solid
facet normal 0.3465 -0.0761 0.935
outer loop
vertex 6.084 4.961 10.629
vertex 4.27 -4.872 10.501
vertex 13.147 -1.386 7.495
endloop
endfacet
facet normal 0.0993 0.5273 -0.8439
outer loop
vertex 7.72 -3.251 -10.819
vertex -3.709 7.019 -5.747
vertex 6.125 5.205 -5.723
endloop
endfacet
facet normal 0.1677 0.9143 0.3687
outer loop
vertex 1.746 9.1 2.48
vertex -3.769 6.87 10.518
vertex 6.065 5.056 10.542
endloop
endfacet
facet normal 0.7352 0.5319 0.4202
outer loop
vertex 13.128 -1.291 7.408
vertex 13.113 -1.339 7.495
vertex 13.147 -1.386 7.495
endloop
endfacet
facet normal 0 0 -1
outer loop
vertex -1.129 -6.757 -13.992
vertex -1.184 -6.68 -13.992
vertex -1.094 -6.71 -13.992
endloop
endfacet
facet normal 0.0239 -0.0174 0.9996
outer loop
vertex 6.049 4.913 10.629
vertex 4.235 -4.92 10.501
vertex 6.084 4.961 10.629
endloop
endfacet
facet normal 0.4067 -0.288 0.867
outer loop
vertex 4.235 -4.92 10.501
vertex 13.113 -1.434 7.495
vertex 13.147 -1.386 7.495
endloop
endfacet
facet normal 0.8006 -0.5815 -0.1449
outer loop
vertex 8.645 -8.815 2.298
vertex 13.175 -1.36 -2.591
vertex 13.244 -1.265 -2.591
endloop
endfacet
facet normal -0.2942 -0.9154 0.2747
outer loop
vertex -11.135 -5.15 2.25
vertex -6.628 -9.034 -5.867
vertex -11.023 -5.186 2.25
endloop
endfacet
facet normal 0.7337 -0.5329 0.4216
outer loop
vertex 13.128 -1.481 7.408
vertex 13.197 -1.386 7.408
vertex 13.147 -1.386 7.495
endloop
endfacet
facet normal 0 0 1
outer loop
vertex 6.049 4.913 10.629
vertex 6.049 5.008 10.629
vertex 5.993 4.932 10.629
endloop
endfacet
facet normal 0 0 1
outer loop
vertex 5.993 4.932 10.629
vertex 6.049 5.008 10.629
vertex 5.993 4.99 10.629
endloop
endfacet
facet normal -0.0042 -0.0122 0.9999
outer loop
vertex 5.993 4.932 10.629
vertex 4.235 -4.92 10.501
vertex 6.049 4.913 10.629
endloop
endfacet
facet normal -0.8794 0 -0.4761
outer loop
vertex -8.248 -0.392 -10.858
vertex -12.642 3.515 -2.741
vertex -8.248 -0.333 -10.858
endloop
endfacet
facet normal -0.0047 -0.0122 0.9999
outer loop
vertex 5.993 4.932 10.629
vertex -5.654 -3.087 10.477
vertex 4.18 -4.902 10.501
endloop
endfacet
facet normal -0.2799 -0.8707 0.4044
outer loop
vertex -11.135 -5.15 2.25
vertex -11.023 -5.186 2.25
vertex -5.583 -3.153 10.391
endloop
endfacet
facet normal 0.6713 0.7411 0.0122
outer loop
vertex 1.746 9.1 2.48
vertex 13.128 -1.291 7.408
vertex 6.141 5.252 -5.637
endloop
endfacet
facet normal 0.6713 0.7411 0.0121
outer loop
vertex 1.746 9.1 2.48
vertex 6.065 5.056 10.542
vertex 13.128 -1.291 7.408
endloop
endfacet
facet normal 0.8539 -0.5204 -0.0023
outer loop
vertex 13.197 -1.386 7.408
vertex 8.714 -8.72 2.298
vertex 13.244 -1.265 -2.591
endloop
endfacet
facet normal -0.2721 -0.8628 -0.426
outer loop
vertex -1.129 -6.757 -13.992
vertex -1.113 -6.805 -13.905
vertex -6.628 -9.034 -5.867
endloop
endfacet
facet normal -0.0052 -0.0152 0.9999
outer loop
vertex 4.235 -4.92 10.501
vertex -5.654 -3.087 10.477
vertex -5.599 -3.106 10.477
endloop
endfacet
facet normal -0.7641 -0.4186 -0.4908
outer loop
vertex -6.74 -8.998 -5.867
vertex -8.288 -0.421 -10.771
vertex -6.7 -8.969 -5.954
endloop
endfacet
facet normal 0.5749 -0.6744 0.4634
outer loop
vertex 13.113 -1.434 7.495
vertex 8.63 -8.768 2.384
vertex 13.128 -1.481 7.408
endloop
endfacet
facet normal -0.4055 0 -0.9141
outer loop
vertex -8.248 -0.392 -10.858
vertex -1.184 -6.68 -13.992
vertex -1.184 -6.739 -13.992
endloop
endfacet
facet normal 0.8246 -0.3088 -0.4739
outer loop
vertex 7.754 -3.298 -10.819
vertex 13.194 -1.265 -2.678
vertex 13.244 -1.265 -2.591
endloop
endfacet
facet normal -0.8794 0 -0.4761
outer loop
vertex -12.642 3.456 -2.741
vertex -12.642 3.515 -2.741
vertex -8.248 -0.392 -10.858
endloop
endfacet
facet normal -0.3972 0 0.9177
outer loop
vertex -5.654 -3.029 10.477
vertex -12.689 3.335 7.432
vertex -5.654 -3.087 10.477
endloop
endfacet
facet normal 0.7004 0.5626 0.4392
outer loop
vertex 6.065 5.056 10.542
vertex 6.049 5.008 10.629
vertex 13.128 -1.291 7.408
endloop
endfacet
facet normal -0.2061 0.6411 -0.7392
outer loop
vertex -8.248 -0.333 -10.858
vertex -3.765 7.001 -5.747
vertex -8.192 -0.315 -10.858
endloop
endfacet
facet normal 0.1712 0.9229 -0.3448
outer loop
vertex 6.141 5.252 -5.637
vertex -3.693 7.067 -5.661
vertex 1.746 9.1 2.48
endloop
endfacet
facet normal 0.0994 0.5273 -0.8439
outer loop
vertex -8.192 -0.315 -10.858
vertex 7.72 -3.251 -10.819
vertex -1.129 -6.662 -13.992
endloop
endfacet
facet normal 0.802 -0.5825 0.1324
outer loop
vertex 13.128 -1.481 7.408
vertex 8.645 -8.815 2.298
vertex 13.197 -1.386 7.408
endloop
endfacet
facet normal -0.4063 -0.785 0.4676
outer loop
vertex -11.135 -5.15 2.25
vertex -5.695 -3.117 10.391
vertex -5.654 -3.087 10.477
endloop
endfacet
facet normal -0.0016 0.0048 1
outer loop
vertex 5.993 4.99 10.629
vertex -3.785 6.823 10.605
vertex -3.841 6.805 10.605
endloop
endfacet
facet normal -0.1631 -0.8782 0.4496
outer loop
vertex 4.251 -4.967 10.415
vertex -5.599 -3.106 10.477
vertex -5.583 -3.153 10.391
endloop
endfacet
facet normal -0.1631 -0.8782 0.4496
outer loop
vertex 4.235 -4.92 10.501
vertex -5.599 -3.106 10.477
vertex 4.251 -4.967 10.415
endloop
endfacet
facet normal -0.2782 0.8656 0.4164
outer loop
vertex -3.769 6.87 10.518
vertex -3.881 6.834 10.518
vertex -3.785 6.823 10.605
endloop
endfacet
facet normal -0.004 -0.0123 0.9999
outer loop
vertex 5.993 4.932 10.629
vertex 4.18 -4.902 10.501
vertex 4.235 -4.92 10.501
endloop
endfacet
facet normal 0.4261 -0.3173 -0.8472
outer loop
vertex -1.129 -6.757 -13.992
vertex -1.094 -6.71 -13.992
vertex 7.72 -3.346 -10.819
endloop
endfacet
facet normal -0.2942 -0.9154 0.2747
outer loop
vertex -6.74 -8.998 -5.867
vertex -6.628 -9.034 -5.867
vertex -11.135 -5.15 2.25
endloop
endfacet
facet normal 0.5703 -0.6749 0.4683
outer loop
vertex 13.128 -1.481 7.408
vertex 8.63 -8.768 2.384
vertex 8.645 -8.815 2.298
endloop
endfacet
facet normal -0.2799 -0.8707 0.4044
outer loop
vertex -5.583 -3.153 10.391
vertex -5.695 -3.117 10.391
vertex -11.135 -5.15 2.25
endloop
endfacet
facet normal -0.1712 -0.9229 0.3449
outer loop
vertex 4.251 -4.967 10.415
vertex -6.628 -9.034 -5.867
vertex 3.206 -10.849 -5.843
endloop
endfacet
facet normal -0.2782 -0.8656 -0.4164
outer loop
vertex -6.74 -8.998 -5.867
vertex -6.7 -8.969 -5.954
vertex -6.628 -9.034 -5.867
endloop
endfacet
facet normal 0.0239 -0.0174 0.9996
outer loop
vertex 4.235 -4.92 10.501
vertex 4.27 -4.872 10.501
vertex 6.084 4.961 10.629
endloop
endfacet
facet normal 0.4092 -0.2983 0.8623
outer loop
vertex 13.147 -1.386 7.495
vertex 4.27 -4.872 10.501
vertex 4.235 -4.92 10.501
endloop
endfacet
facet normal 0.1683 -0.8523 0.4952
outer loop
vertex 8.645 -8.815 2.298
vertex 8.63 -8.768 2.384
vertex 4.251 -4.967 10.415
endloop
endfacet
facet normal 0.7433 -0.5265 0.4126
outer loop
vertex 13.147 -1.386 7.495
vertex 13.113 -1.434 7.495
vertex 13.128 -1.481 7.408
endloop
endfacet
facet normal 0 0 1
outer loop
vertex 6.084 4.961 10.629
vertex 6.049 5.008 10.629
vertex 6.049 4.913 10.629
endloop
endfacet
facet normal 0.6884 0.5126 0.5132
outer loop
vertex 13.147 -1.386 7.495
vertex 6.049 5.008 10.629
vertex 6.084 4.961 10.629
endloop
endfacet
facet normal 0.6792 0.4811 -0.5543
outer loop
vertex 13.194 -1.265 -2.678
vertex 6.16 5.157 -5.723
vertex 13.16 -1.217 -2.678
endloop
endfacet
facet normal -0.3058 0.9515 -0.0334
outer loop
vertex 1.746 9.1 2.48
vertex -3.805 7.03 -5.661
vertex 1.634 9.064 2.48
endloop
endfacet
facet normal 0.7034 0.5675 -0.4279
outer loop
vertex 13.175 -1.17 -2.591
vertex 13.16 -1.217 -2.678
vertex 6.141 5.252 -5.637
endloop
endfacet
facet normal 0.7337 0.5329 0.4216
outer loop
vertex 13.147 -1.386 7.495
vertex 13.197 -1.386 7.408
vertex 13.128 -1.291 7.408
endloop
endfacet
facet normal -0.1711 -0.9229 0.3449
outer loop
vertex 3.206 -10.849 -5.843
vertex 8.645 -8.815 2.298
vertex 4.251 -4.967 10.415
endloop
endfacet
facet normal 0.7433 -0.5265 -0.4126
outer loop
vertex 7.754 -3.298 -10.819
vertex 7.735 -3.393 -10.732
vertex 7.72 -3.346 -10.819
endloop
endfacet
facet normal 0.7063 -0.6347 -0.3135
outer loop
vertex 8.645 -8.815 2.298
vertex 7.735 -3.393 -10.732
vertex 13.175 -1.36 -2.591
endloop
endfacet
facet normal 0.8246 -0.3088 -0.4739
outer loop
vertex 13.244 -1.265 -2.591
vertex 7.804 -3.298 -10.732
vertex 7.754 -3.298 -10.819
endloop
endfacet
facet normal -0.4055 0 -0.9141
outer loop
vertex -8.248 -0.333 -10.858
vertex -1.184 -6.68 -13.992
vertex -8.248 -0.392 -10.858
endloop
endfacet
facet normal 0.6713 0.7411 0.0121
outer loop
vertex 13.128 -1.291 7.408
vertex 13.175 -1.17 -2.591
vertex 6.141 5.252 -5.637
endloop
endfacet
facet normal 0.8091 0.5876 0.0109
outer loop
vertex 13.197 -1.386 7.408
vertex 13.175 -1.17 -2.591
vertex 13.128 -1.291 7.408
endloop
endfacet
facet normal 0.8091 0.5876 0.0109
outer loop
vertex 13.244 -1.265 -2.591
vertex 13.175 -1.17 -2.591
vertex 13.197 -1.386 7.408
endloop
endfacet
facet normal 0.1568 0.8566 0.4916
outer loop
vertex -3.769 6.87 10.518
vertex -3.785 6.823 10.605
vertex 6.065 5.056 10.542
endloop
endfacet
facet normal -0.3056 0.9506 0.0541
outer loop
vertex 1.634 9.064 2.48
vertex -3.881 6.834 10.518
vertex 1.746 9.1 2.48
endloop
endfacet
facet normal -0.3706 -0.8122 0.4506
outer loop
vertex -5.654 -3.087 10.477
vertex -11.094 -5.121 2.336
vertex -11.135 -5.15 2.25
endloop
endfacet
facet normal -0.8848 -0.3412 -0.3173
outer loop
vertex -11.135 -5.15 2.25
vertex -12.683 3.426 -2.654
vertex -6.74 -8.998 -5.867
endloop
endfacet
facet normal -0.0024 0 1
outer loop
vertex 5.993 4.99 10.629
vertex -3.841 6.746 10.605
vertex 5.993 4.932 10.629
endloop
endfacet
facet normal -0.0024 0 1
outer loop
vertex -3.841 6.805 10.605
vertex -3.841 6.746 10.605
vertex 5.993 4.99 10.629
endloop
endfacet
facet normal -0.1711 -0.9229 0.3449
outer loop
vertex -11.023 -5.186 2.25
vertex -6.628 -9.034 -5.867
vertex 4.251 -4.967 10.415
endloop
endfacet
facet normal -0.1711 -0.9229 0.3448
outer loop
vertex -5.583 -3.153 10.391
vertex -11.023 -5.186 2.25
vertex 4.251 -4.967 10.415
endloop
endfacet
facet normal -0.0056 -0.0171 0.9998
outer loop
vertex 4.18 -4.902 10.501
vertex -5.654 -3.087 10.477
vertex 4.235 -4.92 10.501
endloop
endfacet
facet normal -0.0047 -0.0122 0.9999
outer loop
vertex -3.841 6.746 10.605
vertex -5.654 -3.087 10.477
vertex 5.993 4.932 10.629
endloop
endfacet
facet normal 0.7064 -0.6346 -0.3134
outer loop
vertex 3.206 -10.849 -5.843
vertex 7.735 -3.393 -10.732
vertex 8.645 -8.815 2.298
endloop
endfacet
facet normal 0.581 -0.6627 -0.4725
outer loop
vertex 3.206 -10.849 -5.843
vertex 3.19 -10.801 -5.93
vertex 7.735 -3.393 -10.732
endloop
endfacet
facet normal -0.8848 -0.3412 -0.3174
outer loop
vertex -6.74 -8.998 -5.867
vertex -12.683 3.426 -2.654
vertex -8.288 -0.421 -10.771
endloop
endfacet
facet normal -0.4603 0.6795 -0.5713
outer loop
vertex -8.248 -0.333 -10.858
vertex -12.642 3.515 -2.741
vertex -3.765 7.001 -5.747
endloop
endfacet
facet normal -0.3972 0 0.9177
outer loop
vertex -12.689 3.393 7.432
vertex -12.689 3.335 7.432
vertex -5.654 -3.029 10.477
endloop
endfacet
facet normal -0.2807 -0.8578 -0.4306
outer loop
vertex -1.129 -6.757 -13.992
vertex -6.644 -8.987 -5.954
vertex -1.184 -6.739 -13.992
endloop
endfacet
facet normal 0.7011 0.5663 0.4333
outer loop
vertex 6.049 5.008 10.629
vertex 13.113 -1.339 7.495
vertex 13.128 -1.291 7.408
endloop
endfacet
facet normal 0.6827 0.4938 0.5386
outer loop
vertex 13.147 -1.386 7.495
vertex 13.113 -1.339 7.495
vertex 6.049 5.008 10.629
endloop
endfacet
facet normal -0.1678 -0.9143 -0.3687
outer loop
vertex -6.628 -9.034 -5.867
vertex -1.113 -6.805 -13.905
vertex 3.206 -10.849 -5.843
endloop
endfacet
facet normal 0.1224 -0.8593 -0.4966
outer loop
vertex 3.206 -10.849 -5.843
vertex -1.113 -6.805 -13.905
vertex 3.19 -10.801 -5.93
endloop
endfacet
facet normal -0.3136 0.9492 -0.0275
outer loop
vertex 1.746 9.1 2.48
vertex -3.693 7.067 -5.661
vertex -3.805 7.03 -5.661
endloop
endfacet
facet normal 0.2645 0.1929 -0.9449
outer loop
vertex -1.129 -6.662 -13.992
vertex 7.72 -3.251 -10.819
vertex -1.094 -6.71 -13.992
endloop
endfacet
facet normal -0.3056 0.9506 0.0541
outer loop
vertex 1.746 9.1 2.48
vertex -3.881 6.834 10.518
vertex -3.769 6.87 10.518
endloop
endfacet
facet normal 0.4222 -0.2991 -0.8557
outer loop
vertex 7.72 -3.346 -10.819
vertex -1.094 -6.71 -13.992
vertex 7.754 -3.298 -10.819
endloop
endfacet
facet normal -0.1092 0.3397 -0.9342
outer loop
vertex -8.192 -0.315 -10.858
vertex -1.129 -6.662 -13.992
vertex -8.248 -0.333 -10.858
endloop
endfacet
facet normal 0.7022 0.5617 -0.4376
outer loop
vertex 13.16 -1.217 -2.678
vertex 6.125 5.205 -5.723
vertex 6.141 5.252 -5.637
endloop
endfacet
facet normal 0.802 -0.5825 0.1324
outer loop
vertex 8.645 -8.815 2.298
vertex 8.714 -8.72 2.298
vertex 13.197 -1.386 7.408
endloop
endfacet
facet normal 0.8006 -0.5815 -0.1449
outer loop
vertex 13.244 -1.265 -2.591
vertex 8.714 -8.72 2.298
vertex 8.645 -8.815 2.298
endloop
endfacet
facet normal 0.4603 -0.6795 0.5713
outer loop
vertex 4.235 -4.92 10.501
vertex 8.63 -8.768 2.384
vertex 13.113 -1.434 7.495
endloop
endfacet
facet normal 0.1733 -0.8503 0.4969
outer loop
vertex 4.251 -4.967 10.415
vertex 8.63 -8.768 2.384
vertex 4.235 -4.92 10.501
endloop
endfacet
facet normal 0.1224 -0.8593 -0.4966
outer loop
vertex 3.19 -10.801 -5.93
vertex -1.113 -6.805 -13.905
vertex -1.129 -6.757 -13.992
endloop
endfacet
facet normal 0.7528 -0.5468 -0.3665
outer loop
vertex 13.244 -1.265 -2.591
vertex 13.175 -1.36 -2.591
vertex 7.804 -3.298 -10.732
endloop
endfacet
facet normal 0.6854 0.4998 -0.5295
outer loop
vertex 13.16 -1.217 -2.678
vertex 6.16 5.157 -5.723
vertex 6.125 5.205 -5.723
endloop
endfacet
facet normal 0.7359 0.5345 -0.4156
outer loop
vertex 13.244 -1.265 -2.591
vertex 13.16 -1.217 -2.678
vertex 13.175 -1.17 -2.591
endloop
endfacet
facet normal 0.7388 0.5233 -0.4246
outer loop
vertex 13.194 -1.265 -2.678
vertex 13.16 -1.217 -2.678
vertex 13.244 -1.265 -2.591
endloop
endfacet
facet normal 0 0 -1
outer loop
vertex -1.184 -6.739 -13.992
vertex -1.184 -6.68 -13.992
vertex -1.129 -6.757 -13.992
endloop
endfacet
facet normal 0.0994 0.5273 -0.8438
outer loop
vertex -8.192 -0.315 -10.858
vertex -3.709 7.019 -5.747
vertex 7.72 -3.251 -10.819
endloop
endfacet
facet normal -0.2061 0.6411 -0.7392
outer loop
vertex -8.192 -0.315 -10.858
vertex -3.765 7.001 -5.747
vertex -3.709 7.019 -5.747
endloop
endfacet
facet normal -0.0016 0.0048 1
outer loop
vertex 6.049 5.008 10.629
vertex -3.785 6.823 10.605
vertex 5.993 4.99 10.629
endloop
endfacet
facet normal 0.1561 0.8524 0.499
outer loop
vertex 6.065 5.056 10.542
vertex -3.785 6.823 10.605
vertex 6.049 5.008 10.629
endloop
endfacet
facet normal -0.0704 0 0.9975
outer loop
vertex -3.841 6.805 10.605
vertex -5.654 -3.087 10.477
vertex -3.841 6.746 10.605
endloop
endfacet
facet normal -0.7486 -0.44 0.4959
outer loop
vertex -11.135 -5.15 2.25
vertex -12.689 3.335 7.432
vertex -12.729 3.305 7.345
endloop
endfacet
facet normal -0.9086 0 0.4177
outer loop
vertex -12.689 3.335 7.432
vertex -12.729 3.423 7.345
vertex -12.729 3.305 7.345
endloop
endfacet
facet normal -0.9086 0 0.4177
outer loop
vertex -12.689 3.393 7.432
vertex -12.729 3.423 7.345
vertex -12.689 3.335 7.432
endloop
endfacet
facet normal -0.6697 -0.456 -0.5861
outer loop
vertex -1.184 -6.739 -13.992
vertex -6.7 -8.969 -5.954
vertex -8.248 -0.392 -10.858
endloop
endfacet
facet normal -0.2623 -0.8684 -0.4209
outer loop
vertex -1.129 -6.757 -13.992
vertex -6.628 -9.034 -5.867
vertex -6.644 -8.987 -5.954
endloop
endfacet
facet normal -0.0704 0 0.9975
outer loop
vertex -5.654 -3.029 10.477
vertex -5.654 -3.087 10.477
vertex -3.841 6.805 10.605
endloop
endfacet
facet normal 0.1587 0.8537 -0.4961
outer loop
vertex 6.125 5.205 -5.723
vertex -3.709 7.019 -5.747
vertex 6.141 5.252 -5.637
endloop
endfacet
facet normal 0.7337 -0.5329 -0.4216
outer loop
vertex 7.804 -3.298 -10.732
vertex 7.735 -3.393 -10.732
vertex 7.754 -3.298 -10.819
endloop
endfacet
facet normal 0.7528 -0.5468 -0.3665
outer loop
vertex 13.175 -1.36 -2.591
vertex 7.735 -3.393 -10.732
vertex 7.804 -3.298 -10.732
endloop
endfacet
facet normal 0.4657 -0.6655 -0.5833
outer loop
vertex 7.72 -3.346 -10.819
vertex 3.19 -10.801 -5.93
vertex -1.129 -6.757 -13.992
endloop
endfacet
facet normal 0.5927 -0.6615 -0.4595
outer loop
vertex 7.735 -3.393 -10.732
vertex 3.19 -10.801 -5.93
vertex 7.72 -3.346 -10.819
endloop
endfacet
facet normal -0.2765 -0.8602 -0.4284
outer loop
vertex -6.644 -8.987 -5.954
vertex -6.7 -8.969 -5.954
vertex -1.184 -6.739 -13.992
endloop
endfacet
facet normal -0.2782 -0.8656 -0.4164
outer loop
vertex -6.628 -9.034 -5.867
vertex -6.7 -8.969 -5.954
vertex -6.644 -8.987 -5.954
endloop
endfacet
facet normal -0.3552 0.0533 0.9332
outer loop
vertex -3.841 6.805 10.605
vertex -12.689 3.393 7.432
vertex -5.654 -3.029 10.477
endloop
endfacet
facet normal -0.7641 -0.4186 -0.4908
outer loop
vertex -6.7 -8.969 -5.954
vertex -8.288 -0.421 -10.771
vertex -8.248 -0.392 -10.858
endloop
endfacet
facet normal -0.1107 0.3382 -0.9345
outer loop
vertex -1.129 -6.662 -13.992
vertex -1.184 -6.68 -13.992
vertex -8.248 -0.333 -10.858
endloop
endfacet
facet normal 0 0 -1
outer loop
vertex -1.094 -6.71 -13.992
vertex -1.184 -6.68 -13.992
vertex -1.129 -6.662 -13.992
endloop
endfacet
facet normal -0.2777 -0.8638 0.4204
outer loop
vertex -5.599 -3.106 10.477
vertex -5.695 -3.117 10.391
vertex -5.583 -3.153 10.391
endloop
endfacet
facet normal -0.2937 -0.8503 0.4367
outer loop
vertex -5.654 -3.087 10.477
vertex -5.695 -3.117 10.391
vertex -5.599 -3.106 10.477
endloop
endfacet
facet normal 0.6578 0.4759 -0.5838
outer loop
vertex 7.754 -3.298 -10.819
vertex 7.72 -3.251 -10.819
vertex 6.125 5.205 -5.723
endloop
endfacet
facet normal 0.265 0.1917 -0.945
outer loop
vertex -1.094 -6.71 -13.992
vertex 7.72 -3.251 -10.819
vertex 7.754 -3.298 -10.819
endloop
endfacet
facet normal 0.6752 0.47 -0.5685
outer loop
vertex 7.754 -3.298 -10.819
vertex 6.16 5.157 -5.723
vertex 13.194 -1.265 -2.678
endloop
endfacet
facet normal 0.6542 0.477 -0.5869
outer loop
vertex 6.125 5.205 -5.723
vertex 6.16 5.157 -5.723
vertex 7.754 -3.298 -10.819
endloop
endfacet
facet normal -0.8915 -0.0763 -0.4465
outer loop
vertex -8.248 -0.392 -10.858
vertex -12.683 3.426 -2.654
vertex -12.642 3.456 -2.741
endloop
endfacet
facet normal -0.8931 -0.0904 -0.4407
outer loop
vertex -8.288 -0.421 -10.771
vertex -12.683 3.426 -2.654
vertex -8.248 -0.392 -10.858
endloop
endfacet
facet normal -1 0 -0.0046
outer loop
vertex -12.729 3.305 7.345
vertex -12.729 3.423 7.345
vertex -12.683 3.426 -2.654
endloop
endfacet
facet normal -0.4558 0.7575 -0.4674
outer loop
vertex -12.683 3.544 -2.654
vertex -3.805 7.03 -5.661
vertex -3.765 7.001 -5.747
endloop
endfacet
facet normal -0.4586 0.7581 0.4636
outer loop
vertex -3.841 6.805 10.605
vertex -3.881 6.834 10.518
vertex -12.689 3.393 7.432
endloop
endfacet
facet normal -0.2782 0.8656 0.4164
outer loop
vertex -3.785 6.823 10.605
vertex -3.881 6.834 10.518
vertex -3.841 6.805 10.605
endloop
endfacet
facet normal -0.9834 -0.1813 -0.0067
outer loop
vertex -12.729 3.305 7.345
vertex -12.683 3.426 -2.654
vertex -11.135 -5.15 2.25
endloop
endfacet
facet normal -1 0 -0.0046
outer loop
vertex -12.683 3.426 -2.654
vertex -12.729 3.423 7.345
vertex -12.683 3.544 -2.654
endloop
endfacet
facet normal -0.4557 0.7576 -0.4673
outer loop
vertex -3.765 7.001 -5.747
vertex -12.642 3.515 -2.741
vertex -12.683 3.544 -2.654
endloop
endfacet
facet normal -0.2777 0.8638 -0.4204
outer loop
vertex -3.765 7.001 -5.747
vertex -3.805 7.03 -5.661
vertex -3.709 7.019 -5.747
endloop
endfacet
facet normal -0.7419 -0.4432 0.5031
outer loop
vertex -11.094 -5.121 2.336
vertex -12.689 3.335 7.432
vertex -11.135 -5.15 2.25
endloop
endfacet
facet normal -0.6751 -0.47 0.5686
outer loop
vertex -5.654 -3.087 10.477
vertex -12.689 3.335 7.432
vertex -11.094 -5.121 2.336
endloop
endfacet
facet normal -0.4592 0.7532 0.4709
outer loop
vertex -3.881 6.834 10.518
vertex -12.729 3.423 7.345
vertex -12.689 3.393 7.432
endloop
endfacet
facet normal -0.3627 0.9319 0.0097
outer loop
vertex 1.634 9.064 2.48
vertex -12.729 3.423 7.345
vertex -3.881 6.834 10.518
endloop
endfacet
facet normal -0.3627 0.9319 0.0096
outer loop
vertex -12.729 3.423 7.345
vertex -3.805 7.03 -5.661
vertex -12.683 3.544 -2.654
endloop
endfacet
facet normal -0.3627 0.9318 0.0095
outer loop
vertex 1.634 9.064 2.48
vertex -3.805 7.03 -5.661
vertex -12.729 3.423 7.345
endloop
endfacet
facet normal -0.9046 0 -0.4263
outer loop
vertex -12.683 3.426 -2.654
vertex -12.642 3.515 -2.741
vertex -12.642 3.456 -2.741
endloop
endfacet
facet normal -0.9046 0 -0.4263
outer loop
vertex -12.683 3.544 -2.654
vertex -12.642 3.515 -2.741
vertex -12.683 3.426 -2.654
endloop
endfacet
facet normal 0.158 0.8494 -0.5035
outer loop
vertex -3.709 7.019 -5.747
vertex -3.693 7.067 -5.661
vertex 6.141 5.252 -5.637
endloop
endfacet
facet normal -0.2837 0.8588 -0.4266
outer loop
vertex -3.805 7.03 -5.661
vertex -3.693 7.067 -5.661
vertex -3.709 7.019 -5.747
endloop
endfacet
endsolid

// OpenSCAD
// Auto-generated OpenSCAD file

    inner_points = 10*[[-0.8207364448332389, -0.03625987639799513, -1.077103005931804], [-0.3800079511582095, 0.6775294643132357, 1.0518242237897182], [1.314406218043804, -0.12649016604771388, -0.2591223940027388], [-1.2601675662397096, 0.3485174868667573, -0.26540930122634293], [0.6033917278936528, 0.4960926858162208, 1.0542256086650177], [0.7704376603984122, -0.3298307508154513, -1.0732174835834996], [-0.6659377447570157, -0.8939163933116565, -0.5867330828632719], [-0.5614003085180945, -0.3057984452791665, 1.03905571142295], [0.8614304919402382, -0.8720125870409337, 0.22976339159278825], [-1.105368866163486, -0.5091390300469038, 0.2249606218421892], [0.42199937053376757, -0.4872352237761812, 1.0414570962982492], [0.31746193429484665, -1.0753531718086713, -0.5843316979879724], [-0.3724387452492543, 0.6971415864952342, -0.5660731958680674], [0.17152981239613735, 0.9004821712629716, 0.24802189371269331], [0.6109609338026081, 0.5157048079982192, -0.5636718109927679], [-0.1143999812026689, -0.6709636863619204, -1.390535412940297], [-1.2648455927592903, 0.33639652876676684, 0.7345062944329209], [1.3097281915242232, -0.13861112414770457, 0.7407932016565248]];

    outer_points = 10*[[-0.7646716571891983, -0.4484124824111452, 1.017411015424149], [1.3334724658866113, -0.12832498152302135, 0.16218986970952987], [-0.4159593615000292, 1.137644887460793, -0.5946962179229037], [0.17664237883325157, -0.7784874133111438, 1.0879689744258578], [1.1071187428716376, 0.6035724304303223, -0.48053104208131747], [-1.1309196745075054, 0.7358224064074482, -0.022533265133765135], [-0.837148057149246, -0.8502349634644899, 0.10456608600351325], [0.8191262918806799, -0.7784874133111438, -0.39703890778391676], [-0.3485414671567439, 0.2834849295421984, -1.1103177785764728], [0.10416597887320383, -1.1803098943644885, 0.17512404500522194], [0.5927725688657061, -0.046590001357800344, -1.0397598195747642], [-1.06350178016422, -0.1183375515111464, -0.5381548257873341], [-0.00491846562418119, 0.20174994937697738, 1.009417255474962], [0.7100418473832949, 0.6035724304303223, 0.43725430268582344], [-0.23127218863915502, 0.9336473613303209, 0.3666963436841147], [-1.4605786756525627, -0.1183375515111464, 0.3796305189798069], [1.0038134647415542, -0.9824849394416157, 0.5643536538231018], [0.41121172440827325, 0.9336473613303209, -1.1183115385256597]];

    // Convex hull for inner set (I)
    module inner_hull() {
        hull() {
            for (p = inner_points) {
                translate(p) sphere(r=0.1);
            }
        }
    }

    // Convex hull for outer set (O) minus inner hull (O \ I)
    module outer_minus_inner() {
        difference() {
            hull() {
                for (p = outer_points) {
                    translate(p) sphere(r=0.1);
                }
            }
            inner_hull(); // Subtract inner hull
        }
    }

    // Convex hull for outer set (O) minus all translated inner hulls
    module outer_minus_AllTranslationInner() {
        difference() {
            hull() {
                for (p = outer_points) {
                    translate(p) sphere(r=0.1);
                }
            }
            hull() {
                translate([0,0,50]) inner_hull();
                translate([0,0,-50]) inner_hull();
            }; // Subtract translated inner hulls
        }
    }

    // Difference between outer_minus_inner and outer_minus_AllTranslationInner
    module outer_minus_inner_diff() {
        difference() {
            // Outer minus inner
            difference() {
                hull() {
                    for (p = outer_points) {
                        translate(p) sphere(r=0.1);
                    }
                }
                inner_hull();
            }

            // Subtract Outer minus AllTranslationInner
            difference() {
                hull() {
                    for (p = outer_points) {
                        translate(p) sphere(r=0.1);
                    }
                }
                hull() {
                    translate([0,0,50]) inner_hull();
                    translate([0,0,-50]) inner_hull();
                };
            }
        }
    }

    // Rendering all with colors applied
    color([1, 0, 0, 0.5]) inner_hull(); // Transparent red
    
